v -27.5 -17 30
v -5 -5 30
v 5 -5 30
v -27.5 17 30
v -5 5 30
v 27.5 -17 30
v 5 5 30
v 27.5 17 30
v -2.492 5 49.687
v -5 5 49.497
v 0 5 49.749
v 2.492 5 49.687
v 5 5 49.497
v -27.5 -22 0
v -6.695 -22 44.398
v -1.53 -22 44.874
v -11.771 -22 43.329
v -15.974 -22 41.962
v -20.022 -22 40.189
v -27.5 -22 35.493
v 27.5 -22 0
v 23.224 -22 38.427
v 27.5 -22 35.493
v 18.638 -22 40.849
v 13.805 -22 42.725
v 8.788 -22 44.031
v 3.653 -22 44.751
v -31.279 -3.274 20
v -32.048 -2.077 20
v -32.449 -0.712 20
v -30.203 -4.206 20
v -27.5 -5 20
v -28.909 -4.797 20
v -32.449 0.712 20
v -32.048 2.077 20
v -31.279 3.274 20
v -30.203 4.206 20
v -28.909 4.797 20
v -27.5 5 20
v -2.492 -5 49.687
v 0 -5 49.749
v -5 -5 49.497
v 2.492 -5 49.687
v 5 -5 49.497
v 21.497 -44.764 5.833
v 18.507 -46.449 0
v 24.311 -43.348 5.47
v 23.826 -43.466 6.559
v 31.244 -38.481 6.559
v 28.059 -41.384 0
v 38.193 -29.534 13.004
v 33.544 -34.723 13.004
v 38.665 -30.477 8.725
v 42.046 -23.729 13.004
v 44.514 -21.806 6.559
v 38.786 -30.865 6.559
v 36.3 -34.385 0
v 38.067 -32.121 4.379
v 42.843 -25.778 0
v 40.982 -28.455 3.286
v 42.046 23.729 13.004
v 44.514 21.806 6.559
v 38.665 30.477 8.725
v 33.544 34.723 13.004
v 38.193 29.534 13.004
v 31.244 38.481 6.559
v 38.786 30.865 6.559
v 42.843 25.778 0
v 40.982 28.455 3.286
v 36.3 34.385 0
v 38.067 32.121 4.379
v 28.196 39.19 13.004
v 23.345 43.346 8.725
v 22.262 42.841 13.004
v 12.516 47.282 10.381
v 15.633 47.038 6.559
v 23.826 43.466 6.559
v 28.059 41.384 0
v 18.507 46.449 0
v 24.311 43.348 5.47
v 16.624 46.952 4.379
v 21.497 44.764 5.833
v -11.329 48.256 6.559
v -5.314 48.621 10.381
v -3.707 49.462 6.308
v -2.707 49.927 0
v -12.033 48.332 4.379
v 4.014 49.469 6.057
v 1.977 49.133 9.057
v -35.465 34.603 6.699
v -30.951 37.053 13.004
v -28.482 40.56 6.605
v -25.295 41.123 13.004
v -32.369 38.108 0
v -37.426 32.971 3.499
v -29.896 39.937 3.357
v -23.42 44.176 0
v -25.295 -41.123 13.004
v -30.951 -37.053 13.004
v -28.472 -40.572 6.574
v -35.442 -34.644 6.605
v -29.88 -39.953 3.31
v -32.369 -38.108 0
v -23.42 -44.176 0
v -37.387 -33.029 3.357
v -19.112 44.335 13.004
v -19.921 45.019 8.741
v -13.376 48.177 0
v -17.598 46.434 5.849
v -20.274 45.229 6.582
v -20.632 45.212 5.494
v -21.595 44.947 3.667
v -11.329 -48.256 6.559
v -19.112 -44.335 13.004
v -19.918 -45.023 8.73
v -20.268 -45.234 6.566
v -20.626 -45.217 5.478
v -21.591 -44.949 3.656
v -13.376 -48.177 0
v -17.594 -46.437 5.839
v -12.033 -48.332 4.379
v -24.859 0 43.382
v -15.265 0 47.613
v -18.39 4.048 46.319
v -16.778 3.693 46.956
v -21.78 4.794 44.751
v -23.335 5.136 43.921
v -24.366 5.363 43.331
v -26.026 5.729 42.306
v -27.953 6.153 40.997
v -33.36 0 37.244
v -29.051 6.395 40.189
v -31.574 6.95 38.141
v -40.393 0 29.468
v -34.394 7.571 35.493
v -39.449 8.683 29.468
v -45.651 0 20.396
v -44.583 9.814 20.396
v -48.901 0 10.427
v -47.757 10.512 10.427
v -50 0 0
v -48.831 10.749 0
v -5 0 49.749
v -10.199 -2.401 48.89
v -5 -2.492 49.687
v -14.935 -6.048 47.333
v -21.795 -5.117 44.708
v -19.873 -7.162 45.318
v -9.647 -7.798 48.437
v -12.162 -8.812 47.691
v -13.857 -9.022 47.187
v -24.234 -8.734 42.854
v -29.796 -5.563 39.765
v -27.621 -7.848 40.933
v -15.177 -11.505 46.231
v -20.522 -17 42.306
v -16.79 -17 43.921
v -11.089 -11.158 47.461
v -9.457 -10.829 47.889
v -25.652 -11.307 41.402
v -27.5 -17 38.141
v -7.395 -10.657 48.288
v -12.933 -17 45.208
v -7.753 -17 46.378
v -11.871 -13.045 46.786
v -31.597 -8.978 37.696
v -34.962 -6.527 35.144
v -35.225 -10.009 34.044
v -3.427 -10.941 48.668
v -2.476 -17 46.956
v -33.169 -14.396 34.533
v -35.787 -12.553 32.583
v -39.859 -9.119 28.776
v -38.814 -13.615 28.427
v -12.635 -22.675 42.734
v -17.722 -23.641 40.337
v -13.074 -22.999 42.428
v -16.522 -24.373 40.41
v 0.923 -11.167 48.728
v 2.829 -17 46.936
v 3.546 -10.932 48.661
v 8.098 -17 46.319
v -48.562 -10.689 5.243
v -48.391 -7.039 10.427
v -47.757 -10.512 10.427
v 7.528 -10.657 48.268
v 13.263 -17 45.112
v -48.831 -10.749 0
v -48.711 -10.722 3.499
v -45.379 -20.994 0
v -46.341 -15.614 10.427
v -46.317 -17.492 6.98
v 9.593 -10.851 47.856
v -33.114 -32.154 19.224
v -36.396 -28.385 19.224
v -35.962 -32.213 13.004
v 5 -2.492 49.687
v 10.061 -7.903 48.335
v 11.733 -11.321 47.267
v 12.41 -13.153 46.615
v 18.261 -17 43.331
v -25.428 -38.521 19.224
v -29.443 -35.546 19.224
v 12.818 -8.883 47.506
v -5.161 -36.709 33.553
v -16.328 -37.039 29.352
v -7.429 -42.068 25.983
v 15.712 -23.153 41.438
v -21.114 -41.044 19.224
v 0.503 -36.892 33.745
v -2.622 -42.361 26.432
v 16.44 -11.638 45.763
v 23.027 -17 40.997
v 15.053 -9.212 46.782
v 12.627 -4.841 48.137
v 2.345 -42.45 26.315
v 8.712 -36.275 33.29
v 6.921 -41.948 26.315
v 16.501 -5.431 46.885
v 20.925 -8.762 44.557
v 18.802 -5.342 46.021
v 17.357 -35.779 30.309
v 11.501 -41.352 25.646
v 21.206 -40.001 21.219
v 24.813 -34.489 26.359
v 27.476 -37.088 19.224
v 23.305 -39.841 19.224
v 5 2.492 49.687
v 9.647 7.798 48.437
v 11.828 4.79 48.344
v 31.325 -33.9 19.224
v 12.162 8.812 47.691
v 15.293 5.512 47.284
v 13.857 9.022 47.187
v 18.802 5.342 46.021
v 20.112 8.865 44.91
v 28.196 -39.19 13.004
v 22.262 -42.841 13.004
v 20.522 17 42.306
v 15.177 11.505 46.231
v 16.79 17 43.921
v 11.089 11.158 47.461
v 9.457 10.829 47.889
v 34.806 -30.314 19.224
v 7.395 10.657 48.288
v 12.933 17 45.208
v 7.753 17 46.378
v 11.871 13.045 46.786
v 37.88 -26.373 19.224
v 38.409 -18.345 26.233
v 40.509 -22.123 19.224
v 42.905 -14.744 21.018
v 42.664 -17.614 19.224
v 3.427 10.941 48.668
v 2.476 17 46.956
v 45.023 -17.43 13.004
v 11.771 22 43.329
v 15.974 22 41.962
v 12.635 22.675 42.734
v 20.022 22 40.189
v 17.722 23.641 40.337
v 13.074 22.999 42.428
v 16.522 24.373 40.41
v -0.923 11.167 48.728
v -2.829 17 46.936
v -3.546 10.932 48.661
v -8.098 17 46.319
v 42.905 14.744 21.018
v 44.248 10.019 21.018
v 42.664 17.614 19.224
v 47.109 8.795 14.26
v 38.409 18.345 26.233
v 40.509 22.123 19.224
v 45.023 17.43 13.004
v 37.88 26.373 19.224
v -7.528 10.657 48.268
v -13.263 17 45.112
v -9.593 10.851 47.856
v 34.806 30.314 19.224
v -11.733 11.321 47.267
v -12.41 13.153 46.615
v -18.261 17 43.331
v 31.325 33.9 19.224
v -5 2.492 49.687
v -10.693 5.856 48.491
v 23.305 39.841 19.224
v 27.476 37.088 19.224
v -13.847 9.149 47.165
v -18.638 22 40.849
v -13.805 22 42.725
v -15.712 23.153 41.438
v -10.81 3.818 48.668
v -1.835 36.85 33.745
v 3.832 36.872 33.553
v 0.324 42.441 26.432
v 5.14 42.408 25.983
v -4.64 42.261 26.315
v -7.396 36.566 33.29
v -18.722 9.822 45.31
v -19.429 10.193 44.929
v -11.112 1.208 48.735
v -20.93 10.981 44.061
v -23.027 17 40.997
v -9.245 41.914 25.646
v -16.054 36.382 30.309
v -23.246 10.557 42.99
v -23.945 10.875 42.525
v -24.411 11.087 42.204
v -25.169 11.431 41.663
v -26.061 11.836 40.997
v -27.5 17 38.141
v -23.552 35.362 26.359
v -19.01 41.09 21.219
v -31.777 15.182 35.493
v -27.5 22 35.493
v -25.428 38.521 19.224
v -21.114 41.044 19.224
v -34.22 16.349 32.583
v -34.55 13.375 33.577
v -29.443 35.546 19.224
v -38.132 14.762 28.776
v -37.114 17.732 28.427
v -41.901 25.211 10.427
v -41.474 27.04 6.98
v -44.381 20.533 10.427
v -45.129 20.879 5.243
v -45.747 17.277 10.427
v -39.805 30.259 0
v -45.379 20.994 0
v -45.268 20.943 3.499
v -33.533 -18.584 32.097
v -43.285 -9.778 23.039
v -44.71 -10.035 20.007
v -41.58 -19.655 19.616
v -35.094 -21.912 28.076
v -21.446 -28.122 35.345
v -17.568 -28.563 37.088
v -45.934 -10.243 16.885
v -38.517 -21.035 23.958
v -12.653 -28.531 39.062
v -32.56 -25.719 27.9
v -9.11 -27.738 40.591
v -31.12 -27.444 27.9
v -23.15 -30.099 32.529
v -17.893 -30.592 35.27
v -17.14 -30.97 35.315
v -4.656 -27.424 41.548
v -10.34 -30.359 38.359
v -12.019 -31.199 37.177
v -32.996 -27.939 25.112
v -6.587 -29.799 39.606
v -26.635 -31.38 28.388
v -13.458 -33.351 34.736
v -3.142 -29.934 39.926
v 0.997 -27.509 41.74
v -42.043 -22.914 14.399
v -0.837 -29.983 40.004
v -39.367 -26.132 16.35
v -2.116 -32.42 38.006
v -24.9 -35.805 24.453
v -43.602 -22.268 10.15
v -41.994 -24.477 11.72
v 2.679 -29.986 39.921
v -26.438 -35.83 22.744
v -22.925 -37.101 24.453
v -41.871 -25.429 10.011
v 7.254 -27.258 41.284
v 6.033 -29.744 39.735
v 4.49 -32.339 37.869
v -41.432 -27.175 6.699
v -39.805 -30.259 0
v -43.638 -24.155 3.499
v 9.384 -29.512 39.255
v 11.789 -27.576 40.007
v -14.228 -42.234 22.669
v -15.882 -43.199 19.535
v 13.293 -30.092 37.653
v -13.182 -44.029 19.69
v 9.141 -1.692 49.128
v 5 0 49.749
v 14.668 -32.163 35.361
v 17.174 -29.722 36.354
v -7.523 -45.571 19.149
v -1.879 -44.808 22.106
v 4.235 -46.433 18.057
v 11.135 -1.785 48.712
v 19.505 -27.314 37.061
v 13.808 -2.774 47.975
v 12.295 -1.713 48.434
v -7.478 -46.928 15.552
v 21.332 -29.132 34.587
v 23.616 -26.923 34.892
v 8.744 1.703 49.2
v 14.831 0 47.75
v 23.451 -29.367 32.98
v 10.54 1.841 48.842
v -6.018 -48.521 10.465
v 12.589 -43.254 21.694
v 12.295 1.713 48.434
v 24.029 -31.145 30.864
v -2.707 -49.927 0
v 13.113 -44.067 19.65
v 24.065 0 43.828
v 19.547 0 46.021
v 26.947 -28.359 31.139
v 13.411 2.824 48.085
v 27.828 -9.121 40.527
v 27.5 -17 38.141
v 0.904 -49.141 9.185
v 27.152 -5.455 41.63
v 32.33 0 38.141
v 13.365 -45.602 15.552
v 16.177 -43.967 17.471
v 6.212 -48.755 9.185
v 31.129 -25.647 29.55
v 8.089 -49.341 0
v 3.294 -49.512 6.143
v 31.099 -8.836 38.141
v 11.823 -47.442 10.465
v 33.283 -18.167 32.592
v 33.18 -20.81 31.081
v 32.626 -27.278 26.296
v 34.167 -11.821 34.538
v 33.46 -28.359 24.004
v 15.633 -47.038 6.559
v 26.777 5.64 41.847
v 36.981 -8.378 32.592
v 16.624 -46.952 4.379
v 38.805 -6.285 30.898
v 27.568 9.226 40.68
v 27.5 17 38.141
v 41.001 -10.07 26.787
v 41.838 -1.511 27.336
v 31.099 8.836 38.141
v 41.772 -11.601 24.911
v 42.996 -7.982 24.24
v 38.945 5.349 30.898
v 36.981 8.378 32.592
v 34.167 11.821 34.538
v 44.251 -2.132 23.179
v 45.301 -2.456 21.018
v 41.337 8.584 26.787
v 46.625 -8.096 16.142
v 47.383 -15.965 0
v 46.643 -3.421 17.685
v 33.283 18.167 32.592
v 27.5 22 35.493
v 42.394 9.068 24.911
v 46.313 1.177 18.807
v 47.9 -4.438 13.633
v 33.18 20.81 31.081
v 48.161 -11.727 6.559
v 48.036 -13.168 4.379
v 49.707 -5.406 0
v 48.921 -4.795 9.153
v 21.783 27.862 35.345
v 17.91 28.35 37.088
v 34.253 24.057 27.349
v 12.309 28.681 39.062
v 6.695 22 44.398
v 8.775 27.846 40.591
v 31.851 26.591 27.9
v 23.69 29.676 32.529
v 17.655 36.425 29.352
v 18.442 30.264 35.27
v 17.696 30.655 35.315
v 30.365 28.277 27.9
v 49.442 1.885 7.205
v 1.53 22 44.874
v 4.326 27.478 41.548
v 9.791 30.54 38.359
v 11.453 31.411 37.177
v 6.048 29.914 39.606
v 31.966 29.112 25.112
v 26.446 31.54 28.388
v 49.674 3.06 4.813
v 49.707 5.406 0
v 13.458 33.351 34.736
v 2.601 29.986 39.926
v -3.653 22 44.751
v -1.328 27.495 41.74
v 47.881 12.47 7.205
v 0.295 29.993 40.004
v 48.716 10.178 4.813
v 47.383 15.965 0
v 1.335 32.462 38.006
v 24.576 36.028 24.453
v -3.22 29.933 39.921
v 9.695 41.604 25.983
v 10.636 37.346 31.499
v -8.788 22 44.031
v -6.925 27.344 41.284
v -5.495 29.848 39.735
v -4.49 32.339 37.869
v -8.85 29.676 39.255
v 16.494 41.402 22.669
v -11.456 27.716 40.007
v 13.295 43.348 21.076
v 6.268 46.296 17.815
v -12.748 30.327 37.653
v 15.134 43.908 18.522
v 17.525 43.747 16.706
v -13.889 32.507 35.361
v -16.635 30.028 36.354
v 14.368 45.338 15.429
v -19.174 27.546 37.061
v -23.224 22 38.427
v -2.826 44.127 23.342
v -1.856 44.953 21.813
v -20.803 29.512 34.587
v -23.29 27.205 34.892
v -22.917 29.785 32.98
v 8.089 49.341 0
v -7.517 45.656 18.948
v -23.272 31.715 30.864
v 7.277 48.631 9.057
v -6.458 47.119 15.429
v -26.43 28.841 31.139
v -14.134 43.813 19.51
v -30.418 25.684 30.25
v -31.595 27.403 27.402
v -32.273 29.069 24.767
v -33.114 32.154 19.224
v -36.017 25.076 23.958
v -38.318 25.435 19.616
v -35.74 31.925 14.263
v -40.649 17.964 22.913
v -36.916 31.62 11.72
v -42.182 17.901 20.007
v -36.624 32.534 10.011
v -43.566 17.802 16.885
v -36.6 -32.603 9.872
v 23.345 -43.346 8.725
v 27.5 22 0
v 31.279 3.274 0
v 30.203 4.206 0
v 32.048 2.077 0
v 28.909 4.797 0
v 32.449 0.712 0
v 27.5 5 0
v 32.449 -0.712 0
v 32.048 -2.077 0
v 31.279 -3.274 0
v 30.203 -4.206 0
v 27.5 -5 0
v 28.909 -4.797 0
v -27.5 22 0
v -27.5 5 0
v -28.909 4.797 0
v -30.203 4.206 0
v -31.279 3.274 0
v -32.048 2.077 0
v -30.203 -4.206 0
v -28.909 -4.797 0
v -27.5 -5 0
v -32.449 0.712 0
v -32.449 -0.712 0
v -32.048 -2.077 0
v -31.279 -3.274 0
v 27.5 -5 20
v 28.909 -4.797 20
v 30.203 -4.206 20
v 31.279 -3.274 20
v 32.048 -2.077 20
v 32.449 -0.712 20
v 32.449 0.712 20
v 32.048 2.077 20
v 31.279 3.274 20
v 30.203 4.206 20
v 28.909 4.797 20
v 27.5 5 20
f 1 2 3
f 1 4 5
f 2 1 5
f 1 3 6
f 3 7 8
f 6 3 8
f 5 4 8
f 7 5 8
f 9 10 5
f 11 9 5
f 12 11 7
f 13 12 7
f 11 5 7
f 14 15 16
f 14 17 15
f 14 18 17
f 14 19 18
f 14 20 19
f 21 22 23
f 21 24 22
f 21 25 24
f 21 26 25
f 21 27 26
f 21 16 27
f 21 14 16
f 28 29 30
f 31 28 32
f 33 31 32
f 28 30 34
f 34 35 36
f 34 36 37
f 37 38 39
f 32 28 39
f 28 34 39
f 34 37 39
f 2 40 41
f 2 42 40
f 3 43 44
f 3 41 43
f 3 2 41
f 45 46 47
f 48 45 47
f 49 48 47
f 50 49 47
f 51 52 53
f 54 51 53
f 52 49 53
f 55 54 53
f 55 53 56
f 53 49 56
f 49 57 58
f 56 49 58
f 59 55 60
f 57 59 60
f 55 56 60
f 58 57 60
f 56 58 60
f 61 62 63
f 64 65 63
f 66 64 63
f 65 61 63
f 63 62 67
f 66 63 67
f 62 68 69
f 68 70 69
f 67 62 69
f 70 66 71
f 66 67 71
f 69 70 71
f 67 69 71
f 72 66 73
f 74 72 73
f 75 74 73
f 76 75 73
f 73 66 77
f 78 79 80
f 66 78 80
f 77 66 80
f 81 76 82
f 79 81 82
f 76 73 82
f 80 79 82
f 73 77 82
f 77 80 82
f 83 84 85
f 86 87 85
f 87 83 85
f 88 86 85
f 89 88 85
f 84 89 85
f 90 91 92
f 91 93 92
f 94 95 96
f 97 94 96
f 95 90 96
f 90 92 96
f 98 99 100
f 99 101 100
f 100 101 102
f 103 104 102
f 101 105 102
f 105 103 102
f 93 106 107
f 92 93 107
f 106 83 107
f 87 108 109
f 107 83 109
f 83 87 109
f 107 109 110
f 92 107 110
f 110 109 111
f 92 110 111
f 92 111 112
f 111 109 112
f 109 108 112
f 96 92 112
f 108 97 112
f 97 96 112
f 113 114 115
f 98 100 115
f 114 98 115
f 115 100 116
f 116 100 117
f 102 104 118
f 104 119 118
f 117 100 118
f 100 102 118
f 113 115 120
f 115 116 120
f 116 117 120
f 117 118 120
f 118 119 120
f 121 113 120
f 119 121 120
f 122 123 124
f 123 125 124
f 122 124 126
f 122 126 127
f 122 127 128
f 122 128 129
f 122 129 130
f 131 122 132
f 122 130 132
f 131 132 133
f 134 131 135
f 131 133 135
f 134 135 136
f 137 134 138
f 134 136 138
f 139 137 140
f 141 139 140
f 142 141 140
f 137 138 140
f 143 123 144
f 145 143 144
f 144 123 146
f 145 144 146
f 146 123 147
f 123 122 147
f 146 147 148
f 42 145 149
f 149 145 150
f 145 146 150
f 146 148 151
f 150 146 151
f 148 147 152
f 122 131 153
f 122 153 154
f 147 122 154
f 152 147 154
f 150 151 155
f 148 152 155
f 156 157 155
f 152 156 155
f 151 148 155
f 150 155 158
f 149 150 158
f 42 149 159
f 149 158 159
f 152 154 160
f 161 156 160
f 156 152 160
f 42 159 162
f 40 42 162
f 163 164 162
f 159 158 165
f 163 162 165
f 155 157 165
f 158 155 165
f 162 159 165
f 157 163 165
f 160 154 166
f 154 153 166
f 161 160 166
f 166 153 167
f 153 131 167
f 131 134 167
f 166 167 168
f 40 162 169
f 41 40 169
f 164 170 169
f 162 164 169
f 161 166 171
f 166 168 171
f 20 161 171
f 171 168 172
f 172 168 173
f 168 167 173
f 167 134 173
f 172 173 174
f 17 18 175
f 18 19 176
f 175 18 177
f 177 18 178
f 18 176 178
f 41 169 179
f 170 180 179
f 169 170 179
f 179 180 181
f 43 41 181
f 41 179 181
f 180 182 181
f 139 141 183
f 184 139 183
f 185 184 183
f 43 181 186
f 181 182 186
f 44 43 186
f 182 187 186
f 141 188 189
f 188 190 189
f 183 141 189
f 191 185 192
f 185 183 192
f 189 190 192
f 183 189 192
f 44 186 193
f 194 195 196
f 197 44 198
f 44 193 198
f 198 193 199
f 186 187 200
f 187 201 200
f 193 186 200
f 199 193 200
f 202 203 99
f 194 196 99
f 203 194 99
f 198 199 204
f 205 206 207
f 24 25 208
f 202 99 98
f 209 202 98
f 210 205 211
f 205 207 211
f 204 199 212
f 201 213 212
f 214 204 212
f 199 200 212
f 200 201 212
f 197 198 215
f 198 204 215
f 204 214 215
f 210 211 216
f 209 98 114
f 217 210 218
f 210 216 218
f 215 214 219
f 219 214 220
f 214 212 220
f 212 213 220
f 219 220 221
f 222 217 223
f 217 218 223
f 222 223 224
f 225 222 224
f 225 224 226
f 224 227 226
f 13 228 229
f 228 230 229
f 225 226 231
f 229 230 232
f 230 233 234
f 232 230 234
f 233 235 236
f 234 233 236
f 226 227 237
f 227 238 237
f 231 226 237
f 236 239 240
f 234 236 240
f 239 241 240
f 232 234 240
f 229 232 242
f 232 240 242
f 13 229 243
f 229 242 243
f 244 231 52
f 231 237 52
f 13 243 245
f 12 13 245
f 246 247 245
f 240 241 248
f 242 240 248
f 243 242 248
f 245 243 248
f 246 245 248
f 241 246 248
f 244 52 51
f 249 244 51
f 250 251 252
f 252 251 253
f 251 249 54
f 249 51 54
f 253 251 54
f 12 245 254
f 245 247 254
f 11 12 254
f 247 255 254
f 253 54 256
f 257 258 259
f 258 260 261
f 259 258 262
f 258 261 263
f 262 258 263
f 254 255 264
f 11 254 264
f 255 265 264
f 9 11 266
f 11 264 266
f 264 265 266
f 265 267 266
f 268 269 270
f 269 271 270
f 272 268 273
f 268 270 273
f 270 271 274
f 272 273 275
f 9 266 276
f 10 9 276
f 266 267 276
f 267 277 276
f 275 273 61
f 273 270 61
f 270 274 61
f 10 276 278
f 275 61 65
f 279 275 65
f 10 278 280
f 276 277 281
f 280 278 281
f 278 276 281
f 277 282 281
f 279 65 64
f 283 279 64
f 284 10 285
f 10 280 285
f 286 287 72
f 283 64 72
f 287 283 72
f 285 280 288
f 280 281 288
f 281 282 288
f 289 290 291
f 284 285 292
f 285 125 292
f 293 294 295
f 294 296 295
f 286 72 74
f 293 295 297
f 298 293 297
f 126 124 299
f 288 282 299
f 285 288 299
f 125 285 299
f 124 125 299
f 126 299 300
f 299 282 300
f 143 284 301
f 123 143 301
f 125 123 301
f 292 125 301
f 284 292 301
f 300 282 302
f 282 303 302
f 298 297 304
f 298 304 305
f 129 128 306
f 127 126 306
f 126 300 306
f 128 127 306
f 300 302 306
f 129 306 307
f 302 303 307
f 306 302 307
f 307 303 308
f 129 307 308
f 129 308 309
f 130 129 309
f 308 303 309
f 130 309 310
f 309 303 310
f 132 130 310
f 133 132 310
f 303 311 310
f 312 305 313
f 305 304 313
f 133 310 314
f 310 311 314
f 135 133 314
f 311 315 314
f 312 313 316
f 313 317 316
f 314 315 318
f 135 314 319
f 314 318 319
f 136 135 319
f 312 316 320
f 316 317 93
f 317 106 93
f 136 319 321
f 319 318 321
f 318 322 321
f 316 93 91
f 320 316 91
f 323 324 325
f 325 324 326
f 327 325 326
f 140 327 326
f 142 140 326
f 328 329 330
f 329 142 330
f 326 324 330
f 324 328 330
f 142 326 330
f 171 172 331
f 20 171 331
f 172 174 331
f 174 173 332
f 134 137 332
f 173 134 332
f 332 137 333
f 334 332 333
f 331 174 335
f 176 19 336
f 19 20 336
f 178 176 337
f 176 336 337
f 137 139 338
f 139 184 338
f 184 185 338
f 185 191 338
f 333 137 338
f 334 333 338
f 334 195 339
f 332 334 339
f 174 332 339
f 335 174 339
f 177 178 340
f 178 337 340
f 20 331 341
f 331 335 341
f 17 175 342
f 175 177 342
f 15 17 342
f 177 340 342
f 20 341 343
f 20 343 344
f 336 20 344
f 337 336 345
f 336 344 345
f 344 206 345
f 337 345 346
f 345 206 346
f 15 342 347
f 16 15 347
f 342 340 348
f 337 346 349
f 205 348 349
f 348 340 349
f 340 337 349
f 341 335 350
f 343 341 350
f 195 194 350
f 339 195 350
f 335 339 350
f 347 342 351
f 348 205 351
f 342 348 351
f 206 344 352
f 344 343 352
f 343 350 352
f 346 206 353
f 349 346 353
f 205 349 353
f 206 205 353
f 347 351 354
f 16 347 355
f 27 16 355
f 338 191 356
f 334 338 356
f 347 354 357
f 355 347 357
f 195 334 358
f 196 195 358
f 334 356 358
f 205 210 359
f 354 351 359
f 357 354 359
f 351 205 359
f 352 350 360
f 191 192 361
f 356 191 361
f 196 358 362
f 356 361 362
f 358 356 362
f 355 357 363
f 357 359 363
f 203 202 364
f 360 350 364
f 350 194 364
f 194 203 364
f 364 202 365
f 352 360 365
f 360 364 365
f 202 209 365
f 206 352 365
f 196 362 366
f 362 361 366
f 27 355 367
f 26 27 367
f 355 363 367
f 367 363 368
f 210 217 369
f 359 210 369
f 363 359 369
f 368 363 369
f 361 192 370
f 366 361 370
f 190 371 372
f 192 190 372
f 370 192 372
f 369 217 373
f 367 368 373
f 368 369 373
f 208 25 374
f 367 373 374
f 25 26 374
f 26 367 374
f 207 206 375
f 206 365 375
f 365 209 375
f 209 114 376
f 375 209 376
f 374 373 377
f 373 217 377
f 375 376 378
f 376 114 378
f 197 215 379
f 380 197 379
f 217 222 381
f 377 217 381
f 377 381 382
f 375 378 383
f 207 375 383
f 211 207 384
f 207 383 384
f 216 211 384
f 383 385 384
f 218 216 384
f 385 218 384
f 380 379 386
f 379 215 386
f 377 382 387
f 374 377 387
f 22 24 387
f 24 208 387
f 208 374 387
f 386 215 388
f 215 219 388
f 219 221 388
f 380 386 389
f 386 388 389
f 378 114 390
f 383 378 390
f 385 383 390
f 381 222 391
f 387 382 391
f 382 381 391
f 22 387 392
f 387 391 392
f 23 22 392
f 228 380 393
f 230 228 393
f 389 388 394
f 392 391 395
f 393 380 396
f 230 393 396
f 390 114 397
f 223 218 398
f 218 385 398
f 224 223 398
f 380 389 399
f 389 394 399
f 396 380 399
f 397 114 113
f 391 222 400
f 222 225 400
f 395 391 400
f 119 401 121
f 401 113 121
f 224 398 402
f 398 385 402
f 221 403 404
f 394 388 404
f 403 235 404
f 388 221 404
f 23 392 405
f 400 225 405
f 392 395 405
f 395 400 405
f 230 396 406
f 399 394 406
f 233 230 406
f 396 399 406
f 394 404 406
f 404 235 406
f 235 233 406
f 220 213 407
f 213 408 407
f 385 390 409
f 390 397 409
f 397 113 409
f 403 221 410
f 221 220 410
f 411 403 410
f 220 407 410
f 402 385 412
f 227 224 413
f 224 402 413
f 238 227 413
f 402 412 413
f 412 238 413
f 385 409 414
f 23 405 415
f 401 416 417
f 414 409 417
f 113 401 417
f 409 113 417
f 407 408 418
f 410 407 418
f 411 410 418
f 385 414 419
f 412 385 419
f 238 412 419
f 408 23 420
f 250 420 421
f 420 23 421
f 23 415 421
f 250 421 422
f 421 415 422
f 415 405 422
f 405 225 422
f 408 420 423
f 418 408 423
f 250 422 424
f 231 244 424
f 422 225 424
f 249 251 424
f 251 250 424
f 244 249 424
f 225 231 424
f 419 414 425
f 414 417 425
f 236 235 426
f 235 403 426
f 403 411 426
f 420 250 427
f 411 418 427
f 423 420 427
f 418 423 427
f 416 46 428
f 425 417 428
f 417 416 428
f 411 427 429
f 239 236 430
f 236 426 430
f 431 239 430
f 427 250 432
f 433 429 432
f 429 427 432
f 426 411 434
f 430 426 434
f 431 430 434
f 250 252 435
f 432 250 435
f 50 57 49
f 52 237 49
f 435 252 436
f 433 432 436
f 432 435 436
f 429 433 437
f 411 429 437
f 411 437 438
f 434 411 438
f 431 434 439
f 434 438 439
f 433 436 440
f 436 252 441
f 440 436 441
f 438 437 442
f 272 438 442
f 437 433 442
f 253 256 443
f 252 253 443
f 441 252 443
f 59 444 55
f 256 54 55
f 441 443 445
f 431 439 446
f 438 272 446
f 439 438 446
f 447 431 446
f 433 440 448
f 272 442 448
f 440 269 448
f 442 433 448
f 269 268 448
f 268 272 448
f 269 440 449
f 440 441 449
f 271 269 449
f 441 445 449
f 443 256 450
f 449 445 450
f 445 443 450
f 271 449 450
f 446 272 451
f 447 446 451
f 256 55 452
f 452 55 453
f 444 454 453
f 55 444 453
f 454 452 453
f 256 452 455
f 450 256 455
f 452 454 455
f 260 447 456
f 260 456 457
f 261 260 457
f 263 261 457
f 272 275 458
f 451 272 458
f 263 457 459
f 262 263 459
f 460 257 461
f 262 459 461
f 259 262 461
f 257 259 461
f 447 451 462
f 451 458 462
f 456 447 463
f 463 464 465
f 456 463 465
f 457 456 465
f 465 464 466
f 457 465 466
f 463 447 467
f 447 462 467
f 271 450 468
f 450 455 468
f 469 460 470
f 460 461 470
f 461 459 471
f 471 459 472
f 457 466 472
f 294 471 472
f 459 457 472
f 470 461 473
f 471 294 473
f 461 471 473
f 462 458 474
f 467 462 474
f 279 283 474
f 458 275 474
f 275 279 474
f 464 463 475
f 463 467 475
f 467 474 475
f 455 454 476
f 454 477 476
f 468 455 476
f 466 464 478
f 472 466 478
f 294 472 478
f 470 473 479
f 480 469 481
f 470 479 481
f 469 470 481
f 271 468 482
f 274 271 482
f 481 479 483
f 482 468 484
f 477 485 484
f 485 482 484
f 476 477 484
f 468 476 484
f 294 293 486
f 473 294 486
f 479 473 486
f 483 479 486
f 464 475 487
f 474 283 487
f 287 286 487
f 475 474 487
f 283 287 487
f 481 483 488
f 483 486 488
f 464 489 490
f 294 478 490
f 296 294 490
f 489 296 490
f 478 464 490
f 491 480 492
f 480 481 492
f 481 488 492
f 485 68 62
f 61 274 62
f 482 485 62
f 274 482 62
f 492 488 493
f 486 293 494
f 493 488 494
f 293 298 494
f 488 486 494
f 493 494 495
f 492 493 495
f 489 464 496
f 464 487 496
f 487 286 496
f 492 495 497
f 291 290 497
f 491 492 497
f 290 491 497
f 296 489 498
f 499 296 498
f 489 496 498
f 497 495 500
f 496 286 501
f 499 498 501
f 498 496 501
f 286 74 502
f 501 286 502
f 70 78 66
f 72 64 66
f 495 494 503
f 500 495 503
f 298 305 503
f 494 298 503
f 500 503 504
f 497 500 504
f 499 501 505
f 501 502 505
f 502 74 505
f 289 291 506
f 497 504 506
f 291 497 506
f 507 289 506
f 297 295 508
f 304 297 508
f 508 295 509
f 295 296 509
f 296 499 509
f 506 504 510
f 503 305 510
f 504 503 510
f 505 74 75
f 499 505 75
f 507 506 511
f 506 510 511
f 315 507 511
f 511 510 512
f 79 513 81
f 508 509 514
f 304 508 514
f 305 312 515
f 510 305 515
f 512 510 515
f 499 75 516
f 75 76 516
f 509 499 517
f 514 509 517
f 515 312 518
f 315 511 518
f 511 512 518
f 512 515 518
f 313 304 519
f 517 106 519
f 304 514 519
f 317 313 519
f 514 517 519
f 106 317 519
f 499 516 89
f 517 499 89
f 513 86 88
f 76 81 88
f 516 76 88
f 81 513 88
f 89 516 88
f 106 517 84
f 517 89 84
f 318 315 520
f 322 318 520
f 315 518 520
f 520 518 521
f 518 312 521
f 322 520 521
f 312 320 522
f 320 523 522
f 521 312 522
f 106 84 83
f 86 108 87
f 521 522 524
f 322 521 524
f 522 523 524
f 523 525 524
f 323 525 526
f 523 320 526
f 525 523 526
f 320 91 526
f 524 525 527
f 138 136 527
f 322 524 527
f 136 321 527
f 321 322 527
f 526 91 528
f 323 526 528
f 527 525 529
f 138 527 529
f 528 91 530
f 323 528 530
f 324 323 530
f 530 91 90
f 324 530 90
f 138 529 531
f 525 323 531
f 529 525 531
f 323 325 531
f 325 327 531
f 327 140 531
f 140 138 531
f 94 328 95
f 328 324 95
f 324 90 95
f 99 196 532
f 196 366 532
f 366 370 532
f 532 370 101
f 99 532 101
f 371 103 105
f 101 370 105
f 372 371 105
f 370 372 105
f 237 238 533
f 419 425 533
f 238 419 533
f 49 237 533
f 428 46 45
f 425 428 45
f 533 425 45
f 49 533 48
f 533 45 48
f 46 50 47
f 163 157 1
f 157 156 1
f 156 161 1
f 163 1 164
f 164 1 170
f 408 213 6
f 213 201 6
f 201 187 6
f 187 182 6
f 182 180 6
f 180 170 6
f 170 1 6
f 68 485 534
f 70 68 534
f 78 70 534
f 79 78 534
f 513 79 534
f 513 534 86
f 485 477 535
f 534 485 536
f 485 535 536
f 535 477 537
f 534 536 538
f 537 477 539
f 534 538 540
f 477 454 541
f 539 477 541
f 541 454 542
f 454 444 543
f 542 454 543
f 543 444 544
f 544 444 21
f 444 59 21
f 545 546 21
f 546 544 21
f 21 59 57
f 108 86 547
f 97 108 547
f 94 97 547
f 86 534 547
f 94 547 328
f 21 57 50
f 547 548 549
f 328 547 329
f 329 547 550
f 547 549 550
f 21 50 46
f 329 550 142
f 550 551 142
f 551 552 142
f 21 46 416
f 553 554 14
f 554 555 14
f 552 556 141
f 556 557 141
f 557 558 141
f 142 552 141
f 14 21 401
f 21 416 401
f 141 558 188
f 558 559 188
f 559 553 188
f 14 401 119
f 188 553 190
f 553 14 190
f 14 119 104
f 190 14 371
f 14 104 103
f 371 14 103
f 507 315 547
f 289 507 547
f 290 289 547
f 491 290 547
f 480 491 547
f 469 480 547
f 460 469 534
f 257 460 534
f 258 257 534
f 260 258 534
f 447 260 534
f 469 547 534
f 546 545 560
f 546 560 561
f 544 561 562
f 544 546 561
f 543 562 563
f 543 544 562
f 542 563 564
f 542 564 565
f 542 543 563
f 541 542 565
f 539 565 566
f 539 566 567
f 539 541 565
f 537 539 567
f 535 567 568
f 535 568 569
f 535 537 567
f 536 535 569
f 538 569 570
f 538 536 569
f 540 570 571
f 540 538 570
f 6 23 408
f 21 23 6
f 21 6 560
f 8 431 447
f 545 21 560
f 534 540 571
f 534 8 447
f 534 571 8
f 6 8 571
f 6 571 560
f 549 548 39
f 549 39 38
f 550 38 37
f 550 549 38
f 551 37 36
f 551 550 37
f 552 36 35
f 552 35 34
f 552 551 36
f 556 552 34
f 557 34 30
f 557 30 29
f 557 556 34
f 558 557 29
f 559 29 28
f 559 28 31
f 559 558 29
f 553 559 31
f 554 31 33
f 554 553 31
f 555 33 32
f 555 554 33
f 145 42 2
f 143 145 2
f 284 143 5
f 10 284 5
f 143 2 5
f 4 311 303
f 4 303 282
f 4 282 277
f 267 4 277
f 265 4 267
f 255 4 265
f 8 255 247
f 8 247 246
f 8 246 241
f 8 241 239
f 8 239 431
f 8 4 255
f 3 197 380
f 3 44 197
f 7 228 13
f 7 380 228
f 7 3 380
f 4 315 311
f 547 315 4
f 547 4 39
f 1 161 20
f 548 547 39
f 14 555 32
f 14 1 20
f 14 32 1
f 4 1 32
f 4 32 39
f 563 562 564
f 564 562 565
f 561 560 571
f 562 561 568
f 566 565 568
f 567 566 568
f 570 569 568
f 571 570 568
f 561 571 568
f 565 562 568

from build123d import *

# Parameters (mm, degrees)
F0_W     = 55
F0_H     = 5
F0_W_2   = 10
F0_H_2   = 10
F3_DEPTH = 100
F4_DEPTH = 30
F6_DEPTH = 20


with BuildPart() as f2:
    # F1 (on Front) → F2 (revolve)
    with BuildSketch(Plane.XZ):
        with BuildLine():
            Line((-50, 0), (0, 0))
            Line((0, 0), (0, 50))
            ThreePointArc((0, 50), (-35.355339, 35.355339), (-50, 0))
        make_face()
    revolve(axis=Axis((0, 0, 25), (0, 0, 1)))

    # F0 (on Top) → F3 (cut)
    with BuildSketch(Plane.XY):
        with Locations((0, -19.5)):
            Rectangle(F0_W, F0_H)
        with Locations((0, 19.5)):
            Rectangle(F0_W, F0_H)
        Rectangle(F0_W_2, F0_H_2)
    extrude(amount=F3_DEPTH, mode=Mode.SUBTRACT)

    # F0 (on Top) → F4 (cut)
    with BuildSketch(Plane.XY):
        Polygon((27.5, 17), (-27.5, 17), (-27.5, 5), (-27.5, -5), (-27.5, -17), (27.5, -17), (27.5, -5), (27.5, 5), align=None)
        Rectangle(F0_W_2, F0_H_2, mode=Mode.SUBTRACT)
    extrude(amount=F4_DEPTH, mode=Mode.SUBTRACT)

    # F5 (on Top) → F6 (cut)
    with BuildSketch(Plane.XY):
        with BuildLine():
            ThreePointArc((-27.5, 5), (-32.5, 0), (-27.5, -5))
            Line((-27.5, -5), (-27.5, 5))
        make_face()
        with BuildLine():
            Line((27.5, 5), (27.5, -5))
            ThreePointArc((27.5, -5), (32.5, 0), (27.5, 5))
        make_face()
    extrude(amount=F6_DEPTH, mode=Mode.SUBTRACT)


solid = f2.part
